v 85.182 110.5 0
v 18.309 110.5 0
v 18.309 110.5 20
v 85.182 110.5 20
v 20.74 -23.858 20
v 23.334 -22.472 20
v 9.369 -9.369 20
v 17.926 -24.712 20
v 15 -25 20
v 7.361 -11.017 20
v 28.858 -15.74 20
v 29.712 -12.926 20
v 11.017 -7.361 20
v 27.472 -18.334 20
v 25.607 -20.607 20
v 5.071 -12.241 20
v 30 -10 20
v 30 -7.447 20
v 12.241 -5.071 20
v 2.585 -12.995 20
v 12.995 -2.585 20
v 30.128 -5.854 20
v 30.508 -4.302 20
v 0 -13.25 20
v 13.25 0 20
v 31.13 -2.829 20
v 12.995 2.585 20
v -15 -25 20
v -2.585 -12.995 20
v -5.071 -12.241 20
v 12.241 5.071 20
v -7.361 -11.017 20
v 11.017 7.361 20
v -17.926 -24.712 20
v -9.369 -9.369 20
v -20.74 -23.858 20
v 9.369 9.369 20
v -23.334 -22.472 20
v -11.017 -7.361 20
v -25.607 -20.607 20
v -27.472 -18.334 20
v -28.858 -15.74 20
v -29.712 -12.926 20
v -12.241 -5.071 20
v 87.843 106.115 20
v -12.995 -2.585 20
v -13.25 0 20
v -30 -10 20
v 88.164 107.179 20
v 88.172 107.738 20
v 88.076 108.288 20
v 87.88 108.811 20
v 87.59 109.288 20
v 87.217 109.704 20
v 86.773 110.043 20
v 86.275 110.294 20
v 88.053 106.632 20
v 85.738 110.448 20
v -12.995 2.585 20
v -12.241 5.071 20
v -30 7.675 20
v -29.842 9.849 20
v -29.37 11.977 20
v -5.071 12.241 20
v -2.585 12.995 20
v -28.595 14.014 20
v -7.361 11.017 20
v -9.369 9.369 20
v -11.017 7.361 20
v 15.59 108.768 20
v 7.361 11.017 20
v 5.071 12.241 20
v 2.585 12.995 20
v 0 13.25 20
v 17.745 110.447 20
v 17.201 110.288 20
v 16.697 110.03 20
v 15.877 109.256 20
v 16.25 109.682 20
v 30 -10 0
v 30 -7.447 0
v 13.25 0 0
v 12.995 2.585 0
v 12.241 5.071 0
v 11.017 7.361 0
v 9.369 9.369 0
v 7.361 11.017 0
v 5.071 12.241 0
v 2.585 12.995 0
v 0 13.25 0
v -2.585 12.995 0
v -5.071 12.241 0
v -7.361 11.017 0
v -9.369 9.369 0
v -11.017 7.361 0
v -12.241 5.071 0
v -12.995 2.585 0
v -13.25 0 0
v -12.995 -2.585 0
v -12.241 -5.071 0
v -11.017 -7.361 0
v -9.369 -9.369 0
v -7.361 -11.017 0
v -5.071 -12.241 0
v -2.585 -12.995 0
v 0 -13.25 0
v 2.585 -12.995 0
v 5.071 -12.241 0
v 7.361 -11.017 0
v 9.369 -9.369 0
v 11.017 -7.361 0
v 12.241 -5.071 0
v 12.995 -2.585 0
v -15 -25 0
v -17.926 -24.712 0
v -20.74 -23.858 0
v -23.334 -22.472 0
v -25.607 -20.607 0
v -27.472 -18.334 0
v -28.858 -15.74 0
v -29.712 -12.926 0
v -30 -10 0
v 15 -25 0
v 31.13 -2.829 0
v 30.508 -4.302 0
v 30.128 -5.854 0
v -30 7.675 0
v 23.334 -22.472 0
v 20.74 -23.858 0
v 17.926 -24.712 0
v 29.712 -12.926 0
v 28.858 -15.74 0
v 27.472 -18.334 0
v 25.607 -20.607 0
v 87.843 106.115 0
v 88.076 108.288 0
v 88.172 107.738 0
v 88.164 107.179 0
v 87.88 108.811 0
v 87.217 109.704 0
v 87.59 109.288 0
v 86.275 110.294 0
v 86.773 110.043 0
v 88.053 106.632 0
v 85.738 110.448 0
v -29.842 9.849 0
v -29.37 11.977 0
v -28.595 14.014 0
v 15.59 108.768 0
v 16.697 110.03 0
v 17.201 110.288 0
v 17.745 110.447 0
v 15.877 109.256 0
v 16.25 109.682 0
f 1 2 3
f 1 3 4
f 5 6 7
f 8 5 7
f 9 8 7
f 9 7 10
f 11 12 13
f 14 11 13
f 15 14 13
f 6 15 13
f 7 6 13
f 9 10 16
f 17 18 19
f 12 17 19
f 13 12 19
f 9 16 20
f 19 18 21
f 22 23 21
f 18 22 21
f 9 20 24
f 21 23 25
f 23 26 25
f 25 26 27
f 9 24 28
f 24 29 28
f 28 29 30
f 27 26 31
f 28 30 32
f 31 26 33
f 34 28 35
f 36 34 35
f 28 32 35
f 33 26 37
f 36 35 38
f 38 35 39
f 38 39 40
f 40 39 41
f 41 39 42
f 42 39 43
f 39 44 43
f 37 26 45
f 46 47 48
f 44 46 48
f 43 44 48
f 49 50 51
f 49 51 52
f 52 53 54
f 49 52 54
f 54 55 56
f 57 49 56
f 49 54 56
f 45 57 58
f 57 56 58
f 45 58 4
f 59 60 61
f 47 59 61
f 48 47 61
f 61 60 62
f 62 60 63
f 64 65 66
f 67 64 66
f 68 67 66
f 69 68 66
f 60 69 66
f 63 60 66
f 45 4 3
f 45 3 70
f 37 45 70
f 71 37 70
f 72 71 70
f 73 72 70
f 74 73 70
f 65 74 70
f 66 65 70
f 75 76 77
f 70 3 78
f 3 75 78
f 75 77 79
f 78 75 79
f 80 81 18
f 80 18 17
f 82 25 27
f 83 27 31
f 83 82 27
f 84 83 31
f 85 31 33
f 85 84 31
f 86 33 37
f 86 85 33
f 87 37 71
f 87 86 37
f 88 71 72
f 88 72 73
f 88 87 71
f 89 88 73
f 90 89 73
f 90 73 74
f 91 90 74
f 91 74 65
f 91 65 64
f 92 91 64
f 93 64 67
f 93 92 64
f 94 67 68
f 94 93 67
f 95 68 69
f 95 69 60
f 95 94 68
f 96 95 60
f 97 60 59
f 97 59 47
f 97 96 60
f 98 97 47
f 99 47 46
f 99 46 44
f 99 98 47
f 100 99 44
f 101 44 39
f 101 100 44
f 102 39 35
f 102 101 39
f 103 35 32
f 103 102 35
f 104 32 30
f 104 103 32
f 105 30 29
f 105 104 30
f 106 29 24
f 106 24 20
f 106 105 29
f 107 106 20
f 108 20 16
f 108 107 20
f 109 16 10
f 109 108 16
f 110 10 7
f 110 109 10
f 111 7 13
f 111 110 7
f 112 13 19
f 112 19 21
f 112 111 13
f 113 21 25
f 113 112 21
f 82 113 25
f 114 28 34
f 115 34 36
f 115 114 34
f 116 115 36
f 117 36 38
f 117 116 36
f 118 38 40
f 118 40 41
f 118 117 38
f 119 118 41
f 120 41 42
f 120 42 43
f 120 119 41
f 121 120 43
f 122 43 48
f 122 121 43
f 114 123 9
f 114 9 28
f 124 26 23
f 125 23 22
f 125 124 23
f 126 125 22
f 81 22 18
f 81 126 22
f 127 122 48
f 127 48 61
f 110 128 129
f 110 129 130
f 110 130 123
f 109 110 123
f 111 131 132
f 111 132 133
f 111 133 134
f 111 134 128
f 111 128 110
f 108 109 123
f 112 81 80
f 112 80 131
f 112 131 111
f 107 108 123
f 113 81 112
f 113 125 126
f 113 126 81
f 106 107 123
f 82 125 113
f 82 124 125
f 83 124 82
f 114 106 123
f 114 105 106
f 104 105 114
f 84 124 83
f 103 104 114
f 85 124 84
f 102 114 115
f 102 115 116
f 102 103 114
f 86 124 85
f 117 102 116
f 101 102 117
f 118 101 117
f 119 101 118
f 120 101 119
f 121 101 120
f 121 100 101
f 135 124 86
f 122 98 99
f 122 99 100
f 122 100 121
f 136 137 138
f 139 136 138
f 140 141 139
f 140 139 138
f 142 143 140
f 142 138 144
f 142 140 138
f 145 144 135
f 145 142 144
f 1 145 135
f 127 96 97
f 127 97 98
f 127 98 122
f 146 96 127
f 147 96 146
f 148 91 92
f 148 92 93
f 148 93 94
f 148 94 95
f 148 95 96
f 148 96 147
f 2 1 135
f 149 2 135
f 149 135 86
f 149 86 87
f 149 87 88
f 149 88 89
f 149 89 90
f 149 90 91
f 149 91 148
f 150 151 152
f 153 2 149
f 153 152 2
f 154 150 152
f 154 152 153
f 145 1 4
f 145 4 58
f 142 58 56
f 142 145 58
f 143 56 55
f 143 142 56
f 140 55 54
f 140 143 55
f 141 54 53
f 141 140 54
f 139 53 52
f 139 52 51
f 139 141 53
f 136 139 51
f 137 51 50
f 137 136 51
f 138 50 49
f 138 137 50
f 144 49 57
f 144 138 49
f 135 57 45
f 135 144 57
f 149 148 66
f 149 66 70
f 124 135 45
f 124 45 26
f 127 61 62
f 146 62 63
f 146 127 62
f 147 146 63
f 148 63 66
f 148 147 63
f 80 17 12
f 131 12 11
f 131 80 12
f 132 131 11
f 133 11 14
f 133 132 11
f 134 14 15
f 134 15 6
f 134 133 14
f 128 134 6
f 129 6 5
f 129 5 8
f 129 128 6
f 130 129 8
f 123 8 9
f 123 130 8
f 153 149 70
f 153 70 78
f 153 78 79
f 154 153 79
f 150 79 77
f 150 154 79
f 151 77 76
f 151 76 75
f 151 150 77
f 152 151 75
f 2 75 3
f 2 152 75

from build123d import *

# Parameters (mm, degrees)
SKETCH1_R          = 13.25
BASE_EXTRUDE_DEPTH = 20


with BuildPart() as part:
    # Sketch1 → Base-Extrude (new body)
    with BuildSketch(Plane.XY):
        with BuildLine():
            Line((30, -7.446984432), (30, -10))
            ThreePointArc((30, -10), (25.606601718, -20.606601718), (15, -25))
            Line((15, -25), (-15, -25))
            ThreePointArc((-15, -25), (-25.606601718, -20.606601718), (-30, -10))
            Line((-30, -10), (-30, 7.67458006))
            ThreePointArc((-30, 7.67458006), (-29.644440107, 10.921174269), (-28.594616806, 14.013853986))
            Line((-28.594616806, 14.013853986), (15.589899408, 108.767854785))
            ThreePointArc((15.589899408, 108.767854785), (16.696923944, 110.030174337), (18.308822769, 110.5))
            Line((18.308822769, 110.5), (85.181647346, 110.5))
            ThreePointArc((85.181647346, 110.5), (87.746382958, 109.056319774), (87.842679846, 106.11475416))
            Line((87.842679846, 106.11475416), (31.129891668, -2.8294983))
            ThreePointArc((31.129891668, -2.8294983), (30.286579302, -5.070125509), (30, -7.446984432))
        make_face()
        Circle(SKETCH1_R, mode=Mode.SUBTRACT)
    extrude(amount=BASE_EXTRUDE_DEPTH)


solid = part.part
